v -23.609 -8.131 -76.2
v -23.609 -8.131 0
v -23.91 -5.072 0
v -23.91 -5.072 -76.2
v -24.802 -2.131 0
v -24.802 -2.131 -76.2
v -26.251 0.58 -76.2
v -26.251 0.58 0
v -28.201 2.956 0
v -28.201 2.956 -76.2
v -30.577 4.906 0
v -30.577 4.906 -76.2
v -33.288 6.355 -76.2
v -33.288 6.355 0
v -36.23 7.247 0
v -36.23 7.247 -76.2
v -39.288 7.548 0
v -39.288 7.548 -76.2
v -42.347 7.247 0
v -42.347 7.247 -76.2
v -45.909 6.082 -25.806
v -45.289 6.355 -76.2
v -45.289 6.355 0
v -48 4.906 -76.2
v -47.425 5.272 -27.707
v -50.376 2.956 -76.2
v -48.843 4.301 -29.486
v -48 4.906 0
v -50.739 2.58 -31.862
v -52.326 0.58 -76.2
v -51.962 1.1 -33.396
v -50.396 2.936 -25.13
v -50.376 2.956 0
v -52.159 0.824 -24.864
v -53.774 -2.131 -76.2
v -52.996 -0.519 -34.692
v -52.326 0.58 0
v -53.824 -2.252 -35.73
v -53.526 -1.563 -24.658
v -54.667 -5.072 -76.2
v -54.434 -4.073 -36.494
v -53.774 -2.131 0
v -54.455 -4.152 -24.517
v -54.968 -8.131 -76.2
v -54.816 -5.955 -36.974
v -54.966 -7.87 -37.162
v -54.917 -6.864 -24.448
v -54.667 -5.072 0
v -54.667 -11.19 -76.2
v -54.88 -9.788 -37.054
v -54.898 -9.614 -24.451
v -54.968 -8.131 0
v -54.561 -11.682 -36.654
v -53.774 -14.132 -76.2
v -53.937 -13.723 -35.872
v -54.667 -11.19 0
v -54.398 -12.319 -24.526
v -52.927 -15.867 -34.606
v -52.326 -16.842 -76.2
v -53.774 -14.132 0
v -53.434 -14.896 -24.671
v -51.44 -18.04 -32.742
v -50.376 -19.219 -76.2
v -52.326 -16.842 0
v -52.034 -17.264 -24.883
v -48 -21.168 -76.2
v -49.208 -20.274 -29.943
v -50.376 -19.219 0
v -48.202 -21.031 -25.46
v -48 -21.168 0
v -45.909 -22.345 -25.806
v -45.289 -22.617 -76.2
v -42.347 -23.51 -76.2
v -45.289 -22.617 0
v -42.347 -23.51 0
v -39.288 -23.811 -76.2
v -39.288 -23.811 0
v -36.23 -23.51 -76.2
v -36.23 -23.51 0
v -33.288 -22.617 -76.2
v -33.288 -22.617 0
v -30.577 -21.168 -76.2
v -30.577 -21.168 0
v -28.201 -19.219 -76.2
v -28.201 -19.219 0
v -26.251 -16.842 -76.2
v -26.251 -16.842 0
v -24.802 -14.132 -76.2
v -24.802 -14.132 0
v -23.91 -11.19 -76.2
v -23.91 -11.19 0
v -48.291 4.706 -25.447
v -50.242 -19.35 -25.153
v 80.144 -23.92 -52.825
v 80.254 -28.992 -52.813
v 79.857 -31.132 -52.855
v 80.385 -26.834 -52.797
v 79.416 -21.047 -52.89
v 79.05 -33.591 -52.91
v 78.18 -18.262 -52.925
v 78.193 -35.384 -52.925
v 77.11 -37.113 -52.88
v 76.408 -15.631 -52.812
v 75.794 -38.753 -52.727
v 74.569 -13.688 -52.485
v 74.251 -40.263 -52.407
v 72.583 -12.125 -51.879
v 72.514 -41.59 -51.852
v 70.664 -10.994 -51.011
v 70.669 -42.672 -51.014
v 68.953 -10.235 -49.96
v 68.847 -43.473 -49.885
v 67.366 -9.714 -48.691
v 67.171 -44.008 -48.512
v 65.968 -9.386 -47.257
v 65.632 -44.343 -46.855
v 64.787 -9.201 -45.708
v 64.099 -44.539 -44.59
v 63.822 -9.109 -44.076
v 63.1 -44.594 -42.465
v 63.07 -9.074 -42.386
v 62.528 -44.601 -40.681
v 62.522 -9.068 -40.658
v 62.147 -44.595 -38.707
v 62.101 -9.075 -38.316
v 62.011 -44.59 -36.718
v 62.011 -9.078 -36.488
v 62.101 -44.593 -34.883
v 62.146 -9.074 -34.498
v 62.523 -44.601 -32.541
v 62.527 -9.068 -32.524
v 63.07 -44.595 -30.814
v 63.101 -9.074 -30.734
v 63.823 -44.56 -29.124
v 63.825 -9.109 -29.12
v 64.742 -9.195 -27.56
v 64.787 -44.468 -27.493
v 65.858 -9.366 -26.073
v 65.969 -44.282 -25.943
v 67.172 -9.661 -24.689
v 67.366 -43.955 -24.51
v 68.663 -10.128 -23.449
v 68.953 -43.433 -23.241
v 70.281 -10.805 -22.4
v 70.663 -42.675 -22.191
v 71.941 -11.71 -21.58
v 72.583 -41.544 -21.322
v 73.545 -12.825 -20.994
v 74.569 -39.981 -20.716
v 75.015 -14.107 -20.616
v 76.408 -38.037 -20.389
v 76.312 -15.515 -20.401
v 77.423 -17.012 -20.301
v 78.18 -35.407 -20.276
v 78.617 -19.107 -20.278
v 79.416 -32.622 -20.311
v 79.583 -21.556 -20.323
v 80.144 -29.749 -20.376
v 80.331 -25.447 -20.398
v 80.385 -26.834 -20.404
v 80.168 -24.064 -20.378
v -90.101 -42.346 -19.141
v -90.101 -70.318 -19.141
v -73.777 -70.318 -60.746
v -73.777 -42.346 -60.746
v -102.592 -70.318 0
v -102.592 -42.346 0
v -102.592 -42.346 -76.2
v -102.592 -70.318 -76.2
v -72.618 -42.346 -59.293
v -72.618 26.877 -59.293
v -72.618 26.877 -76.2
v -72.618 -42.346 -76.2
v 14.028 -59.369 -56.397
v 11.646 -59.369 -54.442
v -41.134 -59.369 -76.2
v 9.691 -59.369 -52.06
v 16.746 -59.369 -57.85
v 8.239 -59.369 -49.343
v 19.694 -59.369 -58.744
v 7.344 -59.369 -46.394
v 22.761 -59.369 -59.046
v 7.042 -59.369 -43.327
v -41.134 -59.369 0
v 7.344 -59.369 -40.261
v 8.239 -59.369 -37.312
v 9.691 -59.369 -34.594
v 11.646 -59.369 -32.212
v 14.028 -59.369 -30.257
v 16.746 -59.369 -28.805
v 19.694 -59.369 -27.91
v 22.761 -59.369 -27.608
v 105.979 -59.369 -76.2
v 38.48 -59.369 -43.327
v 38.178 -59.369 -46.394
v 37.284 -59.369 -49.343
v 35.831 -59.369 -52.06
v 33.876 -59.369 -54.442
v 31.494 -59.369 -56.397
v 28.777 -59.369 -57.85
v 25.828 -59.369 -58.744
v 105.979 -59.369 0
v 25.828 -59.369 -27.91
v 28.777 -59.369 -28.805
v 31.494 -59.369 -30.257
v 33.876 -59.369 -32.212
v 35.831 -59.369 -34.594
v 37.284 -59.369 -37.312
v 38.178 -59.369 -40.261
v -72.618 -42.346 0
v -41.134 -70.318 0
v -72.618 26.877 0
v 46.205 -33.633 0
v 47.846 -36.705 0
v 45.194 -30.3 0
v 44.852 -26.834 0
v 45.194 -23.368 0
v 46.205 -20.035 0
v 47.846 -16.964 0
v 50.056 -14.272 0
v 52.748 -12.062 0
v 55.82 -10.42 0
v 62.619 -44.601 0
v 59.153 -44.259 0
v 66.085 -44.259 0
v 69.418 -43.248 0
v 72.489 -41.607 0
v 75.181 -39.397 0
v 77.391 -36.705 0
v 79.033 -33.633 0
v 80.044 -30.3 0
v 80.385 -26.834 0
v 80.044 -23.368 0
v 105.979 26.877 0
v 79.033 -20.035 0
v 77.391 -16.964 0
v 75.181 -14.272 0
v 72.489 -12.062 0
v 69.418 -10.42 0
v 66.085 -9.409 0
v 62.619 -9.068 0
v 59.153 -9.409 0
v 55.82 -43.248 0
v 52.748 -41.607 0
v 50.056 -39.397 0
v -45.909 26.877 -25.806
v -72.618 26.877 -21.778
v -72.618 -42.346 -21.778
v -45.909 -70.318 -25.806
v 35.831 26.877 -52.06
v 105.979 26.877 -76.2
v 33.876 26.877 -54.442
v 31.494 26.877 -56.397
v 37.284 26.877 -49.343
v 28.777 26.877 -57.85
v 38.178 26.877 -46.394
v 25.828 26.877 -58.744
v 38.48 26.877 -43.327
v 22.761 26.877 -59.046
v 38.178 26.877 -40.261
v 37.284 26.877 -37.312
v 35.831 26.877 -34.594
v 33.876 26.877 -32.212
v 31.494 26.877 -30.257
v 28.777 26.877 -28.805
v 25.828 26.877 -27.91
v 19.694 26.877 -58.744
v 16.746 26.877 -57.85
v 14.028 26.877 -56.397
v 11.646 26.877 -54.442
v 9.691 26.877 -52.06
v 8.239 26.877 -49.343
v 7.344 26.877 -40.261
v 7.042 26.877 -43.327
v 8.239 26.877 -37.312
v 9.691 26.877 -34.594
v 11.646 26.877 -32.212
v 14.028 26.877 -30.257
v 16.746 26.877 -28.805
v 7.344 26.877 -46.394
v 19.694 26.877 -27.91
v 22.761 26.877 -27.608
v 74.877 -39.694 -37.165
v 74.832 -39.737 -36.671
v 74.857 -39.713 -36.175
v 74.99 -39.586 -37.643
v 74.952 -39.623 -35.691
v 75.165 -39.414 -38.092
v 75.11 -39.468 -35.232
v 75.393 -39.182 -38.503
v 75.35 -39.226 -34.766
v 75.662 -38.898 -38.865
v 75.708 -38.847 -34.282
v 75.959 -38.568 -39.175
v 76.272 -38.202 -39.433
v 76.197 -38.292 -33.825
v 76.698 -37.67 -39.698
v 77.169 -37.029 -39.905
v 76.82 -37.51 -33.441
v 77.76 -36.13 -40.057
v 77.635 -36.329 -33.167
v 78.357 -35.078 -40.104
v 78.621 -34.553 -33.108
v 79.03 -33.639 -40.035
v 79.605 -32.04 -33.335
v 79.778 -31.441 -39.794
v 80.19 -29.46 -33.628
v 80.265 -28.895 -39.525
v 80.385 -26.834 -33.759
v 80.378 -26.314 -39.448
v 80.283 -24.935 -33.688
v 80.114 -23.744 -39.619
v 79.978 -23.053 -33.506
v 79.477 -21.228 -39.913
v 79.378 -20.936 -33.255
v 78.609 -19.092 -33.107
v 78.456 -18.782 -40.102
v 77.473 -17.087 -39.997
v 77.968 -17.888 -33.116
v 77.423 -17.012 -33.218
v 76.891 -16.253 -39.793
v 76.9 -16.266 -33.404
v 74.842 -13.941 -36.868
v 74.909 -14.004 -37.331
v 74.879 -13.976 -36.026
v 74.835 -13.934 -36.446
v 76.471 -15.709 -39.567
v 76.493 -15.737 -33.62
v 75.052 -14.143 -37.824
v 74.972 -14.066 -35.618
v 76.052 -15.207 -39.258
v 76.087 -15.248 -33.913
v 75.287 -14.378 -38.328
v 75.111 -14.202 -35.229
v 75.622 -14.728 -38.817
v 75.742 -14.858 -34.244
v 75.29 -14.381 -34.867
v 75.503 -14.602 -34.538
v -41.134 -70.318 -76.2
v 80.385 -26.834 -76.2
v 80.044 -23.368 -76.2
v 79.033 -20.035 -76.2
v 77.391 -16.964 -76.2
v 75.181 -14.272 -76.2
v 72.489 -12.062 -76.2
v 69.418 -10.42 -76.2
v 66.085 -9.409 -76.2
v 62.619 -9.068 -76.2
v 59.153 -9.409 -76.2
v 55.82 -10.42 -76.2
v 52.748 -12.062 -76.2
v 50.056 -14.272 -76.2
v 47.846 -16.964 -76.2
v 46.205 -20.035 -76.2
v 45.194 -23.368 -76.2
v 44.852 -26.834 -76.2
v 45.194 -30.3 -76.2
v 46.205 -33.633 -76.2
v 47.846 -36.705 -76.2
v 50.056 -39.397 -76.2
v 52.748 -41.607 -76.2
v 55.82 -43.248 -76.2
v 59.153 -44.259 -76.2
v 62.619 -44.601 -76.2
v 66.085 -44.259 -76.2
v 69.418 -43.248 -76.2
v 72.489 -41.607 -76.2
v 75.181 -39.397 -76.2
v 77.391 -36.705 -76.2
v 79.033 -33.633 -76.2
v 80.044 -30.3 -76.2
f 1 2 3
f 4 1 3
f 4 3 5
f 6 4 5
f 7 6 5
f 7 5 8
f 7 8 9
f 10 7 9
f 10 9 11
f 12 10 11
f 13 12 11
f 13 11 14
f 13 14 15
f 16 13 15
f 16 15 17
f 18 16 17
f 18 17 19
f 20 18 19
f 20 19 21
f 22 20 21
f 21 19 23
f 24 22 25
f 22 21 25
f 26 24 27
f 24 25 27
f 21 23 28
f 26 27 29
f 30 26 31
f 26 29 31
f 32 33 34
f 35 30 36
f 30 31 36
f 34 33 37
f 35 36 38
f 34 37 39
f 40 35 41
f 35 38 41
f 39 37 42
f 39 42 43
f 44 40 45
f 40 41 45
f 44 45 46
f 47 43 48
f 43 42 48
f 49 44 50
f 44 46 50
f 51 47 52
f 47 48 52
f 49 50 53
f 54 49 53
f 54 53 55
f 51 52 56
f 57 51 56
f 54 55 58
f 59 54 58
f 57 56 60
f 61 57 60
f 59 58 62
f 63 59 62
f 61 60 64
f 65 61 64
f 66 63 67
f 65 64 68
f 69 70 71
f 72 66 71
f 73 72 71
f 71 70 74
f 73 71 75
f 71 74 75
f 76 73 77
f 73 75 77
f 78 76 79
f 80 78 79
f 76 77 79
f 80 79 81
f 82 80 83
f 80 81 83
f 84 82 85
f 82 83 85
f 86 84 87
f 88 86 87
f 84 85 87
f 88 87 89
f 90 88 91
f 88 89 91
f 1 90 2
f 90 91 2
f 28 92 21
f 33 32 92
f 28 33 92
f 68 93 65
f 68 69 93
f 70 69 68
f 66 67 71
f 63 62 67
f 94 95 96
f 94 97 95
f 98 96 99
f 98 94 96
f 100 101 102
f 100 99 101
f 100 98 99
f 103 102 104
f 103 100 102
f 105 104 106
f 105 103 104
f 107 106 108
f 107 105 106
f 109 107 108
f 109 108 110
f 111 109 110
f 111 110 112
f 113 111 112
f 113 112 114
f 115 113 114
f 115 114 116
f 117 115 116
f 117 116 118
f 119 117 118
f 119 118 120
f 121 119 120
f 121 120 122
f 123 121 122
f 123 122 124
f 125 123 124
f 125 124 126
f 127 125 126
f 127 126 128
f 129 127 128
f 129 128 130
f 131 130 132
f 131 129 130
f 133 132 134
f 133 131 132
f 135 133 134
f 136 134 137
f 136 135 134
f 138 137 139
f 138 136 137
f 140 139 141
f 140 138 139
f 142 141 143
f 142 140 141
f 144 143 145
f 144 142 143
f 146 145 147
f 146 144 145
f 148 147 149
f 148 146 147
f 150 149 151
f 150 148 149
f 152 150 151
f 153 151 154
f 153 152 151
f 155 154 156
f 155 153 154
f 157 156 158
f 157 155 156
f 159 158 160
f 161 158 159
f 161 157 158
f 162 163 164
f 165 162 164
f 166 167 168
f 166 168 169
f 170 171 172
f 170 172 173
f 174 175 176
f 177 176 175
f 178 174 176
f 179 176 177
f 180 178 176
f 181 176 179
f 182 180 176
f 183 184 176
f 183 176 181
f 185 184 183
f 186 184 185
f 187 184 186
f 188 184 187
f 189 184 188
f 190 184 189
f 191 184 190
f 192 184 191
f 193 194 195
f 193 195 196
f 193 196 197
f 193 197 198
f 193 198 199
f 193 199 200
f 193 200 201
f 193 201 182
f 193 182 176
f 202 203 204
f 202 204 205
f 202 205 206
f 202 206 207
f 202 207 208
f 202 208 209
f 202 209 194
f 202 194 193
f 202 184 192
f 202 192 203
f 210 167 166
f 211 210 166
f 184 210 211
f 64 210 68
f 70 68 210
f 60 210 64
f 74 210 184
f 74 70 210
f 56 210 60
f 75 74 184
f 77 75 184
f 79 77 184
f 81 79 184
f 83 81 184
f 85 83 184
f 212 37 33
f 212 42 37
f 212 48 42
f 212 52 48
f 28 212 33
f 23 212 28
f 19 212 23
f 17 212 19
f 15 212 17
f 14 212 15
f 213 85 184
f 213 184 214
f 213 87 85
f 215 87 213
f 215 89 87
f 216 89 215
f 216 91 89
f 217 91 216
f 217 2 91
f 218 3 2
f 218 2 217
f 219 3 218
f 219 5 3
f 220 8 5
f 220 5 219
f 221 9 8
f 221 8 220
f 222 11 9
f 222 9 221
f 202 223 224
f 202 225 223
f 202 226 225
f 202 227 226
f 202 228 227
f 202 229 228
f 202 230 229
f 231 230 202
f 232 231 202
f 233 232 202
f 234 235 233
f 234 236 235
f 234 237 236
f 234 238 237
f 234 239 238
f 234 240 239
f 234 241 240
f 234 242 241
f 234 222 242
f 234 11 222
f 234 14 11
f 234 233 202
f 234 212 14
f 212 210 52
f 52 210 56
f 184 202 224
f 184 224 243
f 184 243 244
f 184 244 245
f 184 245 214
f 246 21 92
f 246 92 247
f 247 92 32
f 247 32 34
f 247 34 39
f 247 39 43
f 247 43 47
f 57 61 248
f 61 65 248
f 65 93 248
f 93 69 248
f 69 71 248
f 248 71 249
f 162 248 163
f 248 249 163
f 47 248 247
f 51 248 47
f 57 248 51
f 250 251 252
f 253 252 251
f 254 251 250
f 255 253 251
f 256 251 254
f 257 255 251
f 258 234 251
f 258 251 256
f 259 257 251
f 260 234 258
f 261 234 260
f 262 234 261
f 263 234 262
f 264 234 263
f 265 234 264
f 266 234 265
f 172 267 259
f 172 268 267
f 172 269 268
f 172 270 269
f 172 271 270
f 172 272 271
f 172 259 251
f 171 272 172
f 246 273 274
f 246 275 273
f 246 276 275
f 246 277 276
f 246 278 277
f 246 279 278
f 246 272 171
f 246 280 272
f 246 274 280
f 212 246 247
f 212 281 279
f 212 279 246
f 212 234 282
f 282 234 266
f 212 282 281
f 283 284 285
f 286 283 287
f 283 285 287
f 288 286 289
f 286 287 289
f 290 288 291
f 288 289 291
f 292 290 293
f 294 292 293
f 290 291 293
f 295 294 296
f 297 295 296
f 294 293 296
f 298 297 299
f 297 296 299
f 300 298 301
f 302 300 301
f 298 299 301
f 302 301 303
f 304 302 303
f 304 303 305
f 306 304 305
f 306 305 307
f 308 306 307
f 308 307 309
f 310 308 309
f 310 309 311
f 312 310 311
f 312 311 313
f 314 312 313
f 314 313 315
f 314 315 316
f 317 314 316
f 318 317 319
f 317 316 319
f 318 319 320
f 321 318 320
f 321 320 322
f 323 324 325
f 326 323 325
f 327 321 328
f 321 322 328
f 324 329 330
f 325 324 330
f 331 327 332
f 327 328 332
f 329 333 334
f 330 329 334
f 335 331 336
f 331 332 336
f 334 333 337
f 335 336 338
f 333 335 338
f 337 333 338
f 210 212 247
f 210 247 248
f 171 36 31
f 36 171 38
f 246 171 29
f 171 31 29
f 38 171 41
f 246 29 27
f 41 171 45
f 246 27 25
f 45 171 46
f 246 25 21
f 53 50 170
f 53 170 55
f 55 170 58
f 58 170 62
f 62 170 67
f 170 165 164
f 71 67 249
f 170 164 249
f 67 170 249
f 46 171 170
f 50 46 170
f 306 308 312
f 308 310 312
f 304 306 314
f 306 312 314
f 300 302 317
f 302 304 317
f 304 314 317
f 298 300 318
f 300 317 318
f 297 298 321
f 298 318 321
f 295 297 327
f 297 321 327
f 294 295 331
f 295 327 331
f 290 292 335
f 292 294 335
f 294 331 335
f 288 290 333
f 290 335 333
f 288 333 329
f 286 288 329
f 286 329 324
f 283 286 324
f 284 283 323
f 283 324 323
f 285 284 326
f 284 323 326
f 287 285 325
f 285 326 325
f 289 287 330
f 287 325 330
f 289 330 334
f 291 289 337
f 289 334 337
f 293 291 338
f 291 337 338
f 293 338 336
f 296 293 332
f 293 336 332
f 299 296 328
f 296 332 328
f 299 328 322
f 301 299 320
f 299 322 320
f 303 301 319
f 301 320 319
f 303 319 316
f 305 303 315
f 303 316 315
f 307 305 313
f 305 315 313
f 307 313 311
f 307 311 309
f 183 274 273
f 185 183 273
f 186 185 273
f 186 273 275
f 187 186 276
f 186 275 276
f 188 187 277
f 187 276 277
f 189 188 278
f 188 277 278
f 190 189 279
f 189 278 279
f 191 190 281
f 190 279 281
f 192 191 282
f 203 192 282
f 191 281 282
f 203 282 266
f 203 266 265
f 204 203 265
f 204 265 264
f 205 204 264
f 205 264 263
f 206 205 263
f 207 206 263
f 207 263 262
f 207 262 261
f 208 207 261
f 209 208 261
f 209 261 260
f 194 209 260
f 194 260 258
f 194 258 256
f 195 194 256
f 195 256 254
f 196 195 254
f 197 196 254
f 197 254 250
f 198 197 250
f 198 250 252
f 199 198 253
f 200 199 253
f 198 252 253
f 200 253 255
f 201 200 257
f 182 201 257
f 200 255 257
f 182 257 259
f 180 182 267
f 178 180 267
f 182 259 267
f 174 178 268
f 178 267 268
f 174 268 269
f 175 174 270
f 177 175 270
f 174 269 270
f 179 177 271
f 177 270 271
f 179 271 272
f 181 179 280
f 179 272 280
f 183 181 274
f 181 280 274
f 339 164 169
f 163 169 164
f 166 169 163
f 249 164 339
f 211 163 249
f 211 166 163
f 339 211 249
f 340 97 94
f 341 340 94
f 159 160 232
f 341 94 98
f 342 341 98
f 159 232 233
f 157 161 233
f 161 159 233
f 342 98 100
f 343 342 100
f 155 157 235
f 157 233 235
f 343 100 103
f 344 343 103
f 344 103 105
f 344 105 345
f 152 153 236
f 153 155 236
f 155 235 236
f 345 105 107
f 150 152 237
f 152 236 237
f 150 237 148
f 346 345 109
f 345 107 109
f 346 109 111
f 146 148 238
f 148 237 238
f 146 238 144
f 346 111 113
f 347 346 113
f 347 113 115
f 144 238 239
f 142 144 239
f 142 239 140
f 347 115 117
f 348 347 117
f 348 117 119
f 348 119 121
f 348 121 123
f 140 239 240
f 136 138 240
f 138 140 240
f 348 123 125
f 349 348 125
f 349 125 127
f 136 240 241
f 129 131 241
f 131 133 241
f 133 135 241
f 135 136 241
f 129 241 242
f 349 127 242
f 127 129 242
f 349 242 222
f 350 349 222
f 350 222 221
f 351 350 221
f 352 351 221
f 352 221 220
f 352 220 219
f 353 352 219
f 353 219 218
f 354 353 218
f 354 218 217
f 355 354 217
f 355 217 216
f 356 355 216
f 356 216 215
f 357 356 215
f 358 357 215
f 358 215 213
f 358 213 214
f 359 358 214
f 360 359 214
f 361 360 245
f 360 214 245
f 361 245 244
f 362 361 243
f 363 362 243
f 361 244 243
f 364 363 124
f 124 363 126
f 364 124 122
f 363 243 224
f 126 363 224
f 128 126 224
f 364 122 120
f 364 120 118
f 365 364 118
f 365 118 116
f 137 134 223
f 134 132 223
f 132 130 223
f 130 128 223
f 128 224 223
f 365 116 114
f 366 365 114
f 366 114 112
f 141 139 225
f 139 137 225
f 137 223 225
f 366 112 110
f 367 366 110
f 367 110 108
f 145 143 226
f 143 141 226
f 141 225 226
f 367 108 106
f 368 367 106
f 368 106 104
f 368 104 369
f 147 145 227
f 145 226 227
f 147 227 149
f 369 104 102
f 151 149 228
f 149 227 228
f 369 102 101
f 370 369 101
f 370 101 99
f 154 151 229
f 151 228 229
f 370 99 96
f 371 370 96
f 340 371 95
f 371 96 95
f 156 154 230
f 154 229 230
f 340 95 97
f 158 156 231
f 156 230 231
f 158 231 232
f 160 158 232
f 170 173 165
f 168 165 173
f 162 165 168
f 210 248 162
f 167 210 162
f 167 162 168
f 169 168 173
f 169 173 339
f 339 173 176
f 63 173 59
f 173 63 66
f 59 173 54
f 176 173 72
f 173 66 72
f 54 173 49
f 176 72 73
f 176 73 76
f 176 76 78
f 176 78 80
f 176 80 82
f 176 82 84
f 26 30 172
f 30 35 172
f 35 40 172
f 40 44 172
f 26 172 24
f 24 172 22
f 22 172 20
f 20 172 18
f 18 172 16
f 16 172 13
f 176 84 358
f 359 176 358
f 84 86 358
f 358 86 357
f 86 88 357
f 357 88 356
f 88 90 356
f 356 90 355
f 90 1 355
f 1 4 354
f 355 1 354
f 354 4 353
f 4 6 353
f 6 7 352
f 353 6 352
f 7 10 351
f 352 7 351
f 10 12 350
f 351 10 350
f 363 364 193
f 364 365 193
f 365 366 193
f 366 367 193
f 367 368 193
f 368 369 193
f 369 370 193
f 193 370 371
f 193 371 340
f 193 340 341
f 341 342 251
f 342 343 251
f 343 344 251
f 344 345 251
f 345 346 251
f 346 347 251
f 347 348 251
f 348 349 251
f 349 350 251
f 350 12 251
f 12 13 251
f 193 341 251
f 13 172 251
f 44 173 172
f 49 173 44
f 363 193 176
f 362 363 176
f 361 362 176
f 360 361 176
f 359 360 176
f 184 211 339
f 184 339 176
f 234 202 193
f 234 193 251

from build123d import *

# Parameters (mm, degrees)
F0_R     = 17.76649
F0_R_2   = 15.679579
F1_DEPTH = 76.2
F3_DEPTH = 112.522
F4_R     = 15.719136
F5_DEPTH = 182.626
F6_R     = 16.325262
F6_R_2   = 3.503895
F7_DEPTH = 86.106


with BuildPart() as f1:
    # F0 (on Top) → F1 (new body)
    with BuildSketch(Plane.XY):
        Polygon((105.979137, 26.87672), (-72.61806, 26.87672), (-72.61806, -42.346146), (-102.592185, -42.346146), (-102.592185, -70.317619), (-41.133739, -70.317619), (-41.133739, -59.36873), (105.979137, -59.36873), align=None)
        with Locations((62.618658, -26.834318)):
            Circle(F0_R, mode=Mode.SUBTRACT)
        with Locations((-39.288443, -8.131367)):
            Circle(F0_R_2, mode=Mode.SUBTRACT)
    extrude(amount=-F1_DEPTH)

    # F2 (on face) → F3 (cut)
    with BuildSketch(Plane.XZ.offset(70.317619)):
        Polygon((-73.776924, -60.745504), (-45.90854, -25.806386), (-90.100896, -19.141217), align=None)
    extrude(amount=-F3_DEPTH, mode=Mode.SUBTRACT)

    # F4 (on face) → F5 (cut)
    with BuildSketch(Plane(origin=(0, 26.87672, 0), x_dir=(-1, 0, 0), z_dir=(0, 1, 0))):
        with Locations((-22.761121, -43.327287)):
            Circle(F4_R)
    extrude(amount=-F5_DEPTH, mode=Mode.SUBTRACT)

    # F6 (on face) → F7 (join)
    with BuildSketch(Plane(origin=(0, 26.87672, 0), x_dir=(-1, 0, 0), z_dir=(0, 1, 0))):
        with Locations((-78.335434, -36.600552)):
            Circle(F6_R)
        with Locations((-78.335434, -36.600552)):
            Circle(F6_R_2, mode=Mode.SUBTRACT)
    extrude(amount=-F7_DEPTH)


solid = f1.part
